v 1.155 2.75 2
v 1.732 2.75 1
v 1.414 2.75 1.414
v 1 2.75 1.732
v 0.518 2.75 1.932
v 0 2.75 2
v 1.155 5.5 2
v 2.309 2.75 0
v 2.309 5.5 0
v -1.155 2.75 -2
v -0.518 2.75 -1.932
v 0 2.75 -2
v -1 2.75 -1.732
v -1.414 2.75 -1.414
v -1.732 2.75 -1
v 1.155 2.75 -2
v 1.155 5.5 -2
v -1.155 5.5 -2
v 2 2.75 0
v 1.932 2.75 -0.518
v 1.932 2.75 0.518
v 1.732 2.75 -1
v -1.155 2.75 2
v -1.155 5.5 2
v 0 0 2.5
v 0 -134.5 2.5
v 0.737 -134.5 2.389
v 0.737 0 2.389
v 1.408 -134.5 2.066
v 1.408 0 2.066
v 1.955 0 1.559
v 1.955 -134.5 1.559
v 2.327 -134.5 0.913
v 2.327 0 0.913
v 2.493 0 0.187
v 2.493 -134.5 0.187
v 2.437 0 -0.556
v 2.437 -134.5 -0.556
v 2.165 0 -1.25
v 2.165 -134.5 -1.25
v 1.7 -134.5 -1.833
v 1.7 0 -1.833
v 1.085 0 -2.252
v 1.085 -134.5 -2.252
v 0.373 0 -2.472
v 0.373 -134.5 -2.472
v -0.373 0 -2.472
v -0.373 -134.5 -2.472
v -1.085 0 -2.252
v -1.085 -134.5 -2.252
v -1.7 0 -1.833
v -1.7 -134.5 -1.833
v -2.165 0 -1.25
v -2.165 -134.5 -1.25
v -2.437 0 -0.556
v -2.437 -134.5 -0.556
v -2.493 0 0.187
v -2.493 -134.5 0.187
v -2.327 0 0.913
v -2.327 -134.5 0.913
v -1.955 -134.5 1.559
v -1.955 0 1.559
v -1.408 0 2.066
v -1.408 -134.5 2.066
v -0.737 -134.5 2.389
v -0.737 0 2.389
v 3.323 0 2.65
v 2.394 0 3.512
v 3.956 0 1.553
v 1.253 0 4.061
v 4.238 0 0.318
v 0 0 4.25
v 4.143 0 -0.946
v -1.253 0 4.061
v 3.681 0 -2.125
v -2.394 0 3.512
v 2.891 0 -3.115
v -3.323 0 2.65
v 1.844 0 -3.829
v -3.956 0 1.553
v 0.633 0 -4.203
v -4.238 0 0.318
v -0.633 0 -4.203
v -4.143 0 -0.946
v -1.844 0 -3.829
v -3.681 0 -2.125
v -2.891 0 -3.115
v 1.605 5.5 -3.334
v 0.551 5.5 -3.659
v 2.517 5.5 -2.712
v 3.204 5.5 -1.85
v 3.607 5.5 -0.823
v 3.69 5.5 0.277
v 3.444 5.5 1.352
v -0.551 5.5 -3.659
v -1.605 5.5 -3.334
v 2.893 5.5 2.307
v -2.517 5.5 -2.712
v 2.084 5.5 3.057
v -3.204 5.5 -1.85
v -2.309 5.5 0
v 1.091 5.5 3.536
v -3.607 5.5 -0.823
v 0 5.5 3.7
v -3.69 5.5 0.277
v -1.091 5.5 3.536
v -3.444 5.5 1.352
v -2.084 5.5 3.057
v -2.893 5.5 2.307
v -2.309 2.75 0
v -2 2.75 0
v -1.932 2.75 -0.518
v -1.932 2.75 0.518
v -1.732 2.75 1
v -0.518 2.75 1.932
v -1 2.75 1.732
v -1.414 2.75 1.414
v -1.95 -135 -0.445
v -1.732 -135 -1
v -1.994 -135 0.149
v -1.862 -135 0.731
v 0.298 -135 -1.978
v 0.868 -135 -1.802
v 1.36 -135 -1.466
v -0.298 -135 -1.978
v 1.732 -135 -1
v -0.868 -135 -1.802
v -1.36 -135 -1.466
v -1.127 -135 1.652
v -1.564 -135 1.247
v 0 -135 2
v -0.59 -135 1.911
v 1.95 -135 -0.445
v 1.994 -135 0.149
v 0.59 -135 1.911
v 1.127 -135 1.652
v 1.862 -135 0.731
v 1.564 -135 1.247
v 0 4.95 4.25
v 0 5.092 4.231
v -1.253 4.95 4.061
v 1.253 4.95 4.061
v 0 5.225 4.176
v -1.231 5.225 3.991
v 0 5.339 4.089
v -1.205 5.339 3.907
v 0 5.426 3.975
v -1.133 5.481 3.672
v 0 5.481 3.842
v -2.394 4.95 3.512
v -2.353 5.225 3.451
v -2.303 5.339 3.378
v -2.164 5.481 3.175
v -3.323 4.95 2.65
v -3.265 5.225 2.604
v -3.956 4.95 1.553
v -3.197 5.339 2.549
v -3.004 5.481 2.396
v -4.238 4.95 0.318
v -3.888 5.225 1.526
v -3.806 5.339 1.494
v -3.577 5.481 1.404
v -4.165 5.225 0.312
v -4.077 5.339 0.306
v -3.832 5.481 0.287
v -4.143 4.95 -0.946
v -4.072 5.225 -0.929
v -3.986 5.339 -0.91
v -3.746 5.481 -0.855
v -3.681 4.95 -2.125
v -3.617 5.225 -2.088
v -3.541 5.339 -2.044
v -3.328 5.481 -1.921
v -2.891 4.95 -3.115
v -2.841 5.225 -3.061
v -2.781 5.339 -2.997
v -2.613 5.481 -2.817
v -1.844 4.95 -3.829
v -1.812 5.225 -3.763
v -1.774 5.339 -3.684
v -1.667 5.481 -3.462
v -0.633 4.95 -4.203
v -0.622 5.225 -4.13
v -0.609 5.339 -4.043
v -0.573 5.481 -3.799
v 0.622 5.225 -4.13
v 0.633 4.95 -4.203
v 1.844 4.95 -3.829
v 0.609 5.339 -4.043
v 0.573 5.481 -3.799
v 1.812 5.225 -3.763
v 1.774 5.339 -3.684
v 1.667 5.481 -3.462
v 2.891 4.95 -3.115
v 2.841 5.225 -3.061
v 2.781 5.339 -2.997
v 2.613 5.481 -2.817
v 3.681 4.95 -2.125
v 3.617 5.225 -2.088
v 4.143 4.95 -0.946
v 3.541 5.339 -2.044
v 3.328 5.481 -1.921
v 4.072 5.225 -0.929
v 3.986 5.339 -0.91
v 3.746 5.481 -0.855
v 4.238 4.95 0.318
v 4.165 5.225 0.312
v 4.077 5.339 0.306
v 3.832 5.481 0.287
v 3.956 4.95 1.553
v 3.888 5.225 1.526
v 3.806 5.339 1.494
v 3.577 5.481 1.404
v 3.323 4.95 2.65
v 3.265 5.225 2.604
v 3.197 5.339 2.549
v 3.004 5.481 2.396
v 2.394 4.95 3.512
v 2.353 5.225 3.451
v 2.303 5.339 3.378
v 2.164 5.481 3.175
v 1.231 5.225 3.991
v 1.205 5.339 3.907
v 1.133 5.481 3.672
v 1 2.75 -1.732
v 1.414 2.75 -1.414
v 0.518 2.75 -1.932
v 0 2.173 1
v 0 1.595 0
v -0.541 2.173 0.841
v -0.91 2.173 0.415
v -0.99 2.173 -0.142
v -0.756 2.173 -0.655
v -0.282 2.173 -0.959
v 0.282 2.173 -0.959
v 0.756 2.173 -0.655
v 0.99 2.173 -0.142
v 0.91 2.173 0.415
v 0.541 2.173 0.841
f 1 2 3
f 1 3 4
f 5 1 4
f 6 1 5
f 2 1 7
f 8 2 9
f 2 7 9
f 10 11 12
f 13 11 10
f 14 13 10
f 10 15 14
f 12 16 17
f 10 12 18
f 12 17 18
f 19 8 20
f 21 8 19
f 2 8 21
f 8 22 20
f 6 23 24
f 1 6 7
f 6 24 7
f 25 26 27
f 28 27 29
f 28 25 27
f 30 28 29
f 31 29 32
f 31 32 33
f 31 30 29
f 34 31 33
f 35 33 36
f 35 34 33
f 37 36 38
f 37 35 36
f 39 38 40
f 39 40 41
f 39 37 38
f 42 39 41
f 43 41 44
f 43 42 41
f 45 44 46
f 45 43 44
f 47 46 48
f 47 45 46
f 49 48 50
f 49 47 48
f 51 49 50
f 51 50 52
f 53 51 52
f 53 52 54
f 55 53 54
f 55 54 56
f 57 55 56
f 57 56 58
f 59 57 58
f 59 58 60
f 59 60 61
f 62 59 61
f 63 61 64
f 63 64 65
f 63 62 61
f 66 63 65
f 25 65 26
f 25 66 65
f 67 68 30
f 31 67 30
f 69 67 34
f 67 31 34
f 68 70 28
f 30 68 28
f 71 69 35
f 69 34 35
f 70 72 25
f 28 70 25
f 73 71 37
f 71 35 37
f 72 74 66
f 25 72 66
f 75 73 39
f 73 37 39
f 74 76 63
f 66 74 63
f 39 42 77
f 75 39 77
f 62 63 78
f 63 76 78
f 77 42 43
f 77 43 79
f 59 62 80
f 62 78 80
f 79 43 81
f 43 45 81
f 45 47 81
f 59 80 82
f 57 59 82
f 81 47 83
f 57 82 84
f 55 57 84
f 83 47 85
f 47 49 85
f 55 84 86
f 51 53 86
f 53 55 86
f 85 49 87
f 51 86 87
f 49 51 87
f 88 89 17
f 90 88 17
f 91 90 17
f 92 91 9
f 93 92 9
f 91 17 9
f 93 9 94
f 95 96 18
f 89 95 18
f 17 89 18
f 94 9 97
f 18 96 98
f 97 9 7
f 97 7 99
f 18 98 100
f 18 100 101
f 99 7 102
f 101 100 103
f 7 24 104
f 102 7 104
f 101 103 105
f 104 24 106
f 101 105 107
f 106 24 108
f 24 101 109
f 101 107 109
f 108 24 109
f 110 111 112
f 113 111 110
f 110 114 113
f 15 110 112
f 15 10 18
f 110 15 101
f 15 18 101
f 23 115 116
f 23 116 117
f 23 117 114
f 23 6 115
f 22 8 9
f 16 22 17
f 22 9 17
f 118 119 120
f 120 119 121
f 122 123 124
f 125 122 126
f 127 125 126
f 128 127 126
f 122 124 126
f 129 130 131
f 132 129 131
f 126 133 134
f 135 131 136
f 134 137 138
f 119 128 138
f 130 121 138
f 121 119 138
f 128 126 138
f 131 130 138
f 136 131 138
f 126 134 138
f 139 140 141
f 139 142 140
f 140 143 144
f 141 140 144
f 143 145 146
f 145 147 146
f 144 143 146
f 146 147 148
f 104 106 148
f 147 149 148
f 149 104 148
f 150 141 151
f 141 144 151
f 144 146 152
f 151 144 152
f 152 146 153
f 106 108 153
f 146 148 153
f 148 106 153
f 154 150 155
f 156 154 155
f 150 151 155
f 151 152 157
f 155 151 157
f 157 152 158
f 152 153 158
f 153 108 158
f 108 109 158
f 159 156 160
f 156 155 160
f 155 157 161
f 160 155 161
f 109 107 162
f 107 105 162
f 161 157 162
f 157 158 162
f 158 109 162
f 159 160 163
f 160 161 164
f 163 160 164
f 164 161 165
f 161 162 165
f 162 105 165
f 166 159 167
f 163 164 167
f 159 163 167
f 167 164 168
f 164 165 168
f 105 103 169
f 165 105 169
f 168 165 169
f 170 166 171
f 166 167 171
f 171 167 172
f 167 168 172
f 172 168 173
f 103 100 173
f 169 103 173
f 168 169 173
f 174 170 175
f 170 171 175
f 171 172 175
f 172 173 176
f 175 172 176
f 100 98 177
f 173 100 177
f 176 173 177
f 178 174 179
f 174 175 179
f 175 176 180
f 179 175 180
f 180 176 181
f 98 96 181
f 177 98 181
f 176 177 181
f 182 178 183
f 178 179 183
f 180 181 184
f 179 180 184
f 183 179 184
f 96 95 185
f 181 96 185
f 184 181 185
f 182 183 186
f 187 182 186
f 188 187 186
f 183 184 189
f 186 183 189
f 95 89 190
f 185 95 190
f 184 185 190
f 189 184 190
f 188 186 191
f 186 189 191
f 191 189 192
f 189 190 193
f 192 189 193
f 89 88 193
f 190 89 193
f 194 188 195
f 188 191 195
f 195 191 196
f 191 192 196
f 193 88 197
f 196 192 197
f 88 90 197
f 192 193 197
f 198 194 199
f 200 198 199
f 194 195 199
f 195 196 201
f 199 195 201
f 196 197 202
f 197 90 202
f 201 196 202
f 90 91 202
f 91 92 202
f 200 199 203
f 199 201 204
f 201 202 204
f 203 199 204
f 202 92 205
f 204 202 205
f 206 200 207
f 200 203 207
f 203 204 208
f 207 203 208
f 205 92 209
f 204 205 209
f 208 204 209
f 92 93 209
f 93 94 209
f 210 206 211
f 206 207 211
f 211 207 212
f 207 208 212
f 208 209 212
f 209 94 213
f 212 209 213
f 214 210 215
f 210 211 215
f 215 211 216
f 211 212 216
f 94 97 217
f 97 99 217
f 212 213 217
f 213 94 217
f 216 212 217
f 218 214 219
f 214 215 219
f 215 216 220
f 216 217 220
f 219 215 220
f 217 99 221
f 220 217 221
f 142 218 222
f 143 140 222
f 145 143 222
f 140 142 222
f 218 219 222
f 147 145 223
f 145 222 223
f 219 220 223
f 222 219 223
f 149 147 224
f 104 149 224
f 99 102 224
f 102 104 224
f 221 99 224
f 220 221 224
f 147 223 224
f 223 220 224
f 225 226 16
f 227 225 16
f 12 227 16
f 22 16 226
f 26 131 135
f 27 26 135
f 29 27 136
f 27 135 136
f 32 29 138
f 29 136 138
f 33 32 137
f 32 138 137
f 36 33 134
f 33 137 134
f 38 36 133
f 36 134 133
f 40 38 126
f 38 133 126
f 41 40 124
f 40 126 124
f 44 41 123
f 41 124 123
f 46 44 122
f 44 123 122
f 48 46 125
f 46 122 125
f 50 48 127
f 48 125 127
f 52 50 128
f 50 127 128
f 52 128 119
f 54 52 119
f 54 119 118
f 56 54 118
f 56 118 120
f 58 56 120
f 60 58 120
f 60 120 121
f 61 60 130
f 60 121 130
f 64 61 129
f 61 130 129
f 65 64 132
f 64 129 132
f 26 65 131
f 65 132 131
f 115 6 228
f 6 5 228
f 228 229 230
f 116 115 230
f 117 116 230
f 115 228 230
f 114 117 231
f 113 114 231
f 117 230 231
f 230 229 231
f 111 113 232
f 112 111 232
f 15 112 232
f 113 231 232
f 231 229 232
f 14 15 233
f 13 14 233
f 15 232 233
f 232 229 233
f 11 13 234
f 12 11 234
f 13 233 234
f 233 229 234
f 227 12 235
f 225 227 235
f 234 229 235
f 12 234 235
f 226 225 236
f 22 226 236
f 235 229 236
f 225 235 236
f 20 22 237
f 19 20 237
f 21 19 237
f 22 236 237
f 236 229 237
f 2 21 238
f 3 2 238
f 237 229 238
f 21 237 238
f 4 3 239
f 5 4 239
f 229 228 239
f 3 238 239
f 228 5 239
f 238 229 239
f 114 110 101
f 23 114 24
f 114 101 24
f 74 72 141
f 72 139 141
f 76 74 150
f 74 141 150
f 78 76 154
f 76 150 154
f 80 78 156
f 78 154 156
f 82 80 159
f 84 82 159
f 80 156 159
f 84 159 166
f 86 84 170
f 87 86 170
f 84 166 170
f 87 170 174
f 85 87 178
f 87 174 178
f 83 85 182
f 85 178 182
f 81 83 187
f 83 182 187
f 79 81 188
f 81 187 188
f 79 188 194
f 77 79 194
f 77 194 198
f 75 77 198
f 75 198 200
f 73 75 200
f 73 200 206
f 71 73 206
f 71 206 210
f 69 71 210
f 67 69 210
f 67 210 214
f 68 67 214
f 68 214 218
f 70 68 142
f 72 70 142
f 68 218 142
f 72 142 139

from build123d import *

# Parameters (mm, degrees)
ESQUISSE2_R             = 2.5
BASE_EXTRUSION_DEPTH    = 135
CHANFREIN1_SIZE         = 0.5
ENL_V_MAT_EXTRU_1_DEPTH = 2.75


with BuildPart() as part:
    # Esquisse2 → Base-Extrusion (new body)
    with BuildSketch(Plane(origin=(0, 0, 0), x_dir=(1, 0, 0), z_dir=(0, 1, 0))):
        with Locations(Location((0, 0, 0), (0, 0, 270))):  # turned: the seam where the file's is
            Circle(ESQUISSE2_R)
    extrude(amount=-BASE_EXTRUSION_DEPTH)

    # Chanfrein1
    chanfrein1_edges = [part.edges().sort_by_distance(p)[0] for p in [
        (0, -135, -2.5),
    ]]
    chamfer(chanfrein1_edges, length=CHANFREIN1_SIZE)

    # Esquisse5 → Boss.-Révol.1 (revolve)
    with BuildSketch(Plane.XY, mode=Mode.PRIVATE) as boss_r_vol_1_sk:
        with BuildLine():
            Line((2, 5.5), (2, 2.75))
            Line((2, 2.75), (0, 1.595299462))
            Line((0, 1.595299462), (0, 0))
            Line((0, 0), (4.25, 0))
            Line((4.25, 0), (4.25, 4.95))
            ThreePointArc((4.25, 4.95), (4.08890873, 5.33890873), (3.7, 5.5))
            Line((3.7, 5.5), (2, 5.5))
        make_face()
    revolve(boss_r_vol_1_sk.sketch.rotate(Axis((0, 5.5, 0), (0, -1, 0)), 90), axis=Axis((0, 5.5, 0), (0, -1, 0)))  # turned: the seam where the file's is

    # Esquisse7 → Enlèv. mat.-Extru.1 (cut)
    with BuildSketch(Plane(origin=(0, 5.5, 0), x_dir=(-1, 0, 0), z_dir=(0, 1, 0))):
        Polygon((1.154700538, 2), (-1.154700538, 2), (-2.309401077, 0), (-1.154700538, -2), (1.154700538, -2), (2.309401077, 0), align=None)
    extrude(amount=-ENL_V_MAT_EXTRU_1_DEPTH, mode=Mode.SUBTRACT)


solid = part.part
